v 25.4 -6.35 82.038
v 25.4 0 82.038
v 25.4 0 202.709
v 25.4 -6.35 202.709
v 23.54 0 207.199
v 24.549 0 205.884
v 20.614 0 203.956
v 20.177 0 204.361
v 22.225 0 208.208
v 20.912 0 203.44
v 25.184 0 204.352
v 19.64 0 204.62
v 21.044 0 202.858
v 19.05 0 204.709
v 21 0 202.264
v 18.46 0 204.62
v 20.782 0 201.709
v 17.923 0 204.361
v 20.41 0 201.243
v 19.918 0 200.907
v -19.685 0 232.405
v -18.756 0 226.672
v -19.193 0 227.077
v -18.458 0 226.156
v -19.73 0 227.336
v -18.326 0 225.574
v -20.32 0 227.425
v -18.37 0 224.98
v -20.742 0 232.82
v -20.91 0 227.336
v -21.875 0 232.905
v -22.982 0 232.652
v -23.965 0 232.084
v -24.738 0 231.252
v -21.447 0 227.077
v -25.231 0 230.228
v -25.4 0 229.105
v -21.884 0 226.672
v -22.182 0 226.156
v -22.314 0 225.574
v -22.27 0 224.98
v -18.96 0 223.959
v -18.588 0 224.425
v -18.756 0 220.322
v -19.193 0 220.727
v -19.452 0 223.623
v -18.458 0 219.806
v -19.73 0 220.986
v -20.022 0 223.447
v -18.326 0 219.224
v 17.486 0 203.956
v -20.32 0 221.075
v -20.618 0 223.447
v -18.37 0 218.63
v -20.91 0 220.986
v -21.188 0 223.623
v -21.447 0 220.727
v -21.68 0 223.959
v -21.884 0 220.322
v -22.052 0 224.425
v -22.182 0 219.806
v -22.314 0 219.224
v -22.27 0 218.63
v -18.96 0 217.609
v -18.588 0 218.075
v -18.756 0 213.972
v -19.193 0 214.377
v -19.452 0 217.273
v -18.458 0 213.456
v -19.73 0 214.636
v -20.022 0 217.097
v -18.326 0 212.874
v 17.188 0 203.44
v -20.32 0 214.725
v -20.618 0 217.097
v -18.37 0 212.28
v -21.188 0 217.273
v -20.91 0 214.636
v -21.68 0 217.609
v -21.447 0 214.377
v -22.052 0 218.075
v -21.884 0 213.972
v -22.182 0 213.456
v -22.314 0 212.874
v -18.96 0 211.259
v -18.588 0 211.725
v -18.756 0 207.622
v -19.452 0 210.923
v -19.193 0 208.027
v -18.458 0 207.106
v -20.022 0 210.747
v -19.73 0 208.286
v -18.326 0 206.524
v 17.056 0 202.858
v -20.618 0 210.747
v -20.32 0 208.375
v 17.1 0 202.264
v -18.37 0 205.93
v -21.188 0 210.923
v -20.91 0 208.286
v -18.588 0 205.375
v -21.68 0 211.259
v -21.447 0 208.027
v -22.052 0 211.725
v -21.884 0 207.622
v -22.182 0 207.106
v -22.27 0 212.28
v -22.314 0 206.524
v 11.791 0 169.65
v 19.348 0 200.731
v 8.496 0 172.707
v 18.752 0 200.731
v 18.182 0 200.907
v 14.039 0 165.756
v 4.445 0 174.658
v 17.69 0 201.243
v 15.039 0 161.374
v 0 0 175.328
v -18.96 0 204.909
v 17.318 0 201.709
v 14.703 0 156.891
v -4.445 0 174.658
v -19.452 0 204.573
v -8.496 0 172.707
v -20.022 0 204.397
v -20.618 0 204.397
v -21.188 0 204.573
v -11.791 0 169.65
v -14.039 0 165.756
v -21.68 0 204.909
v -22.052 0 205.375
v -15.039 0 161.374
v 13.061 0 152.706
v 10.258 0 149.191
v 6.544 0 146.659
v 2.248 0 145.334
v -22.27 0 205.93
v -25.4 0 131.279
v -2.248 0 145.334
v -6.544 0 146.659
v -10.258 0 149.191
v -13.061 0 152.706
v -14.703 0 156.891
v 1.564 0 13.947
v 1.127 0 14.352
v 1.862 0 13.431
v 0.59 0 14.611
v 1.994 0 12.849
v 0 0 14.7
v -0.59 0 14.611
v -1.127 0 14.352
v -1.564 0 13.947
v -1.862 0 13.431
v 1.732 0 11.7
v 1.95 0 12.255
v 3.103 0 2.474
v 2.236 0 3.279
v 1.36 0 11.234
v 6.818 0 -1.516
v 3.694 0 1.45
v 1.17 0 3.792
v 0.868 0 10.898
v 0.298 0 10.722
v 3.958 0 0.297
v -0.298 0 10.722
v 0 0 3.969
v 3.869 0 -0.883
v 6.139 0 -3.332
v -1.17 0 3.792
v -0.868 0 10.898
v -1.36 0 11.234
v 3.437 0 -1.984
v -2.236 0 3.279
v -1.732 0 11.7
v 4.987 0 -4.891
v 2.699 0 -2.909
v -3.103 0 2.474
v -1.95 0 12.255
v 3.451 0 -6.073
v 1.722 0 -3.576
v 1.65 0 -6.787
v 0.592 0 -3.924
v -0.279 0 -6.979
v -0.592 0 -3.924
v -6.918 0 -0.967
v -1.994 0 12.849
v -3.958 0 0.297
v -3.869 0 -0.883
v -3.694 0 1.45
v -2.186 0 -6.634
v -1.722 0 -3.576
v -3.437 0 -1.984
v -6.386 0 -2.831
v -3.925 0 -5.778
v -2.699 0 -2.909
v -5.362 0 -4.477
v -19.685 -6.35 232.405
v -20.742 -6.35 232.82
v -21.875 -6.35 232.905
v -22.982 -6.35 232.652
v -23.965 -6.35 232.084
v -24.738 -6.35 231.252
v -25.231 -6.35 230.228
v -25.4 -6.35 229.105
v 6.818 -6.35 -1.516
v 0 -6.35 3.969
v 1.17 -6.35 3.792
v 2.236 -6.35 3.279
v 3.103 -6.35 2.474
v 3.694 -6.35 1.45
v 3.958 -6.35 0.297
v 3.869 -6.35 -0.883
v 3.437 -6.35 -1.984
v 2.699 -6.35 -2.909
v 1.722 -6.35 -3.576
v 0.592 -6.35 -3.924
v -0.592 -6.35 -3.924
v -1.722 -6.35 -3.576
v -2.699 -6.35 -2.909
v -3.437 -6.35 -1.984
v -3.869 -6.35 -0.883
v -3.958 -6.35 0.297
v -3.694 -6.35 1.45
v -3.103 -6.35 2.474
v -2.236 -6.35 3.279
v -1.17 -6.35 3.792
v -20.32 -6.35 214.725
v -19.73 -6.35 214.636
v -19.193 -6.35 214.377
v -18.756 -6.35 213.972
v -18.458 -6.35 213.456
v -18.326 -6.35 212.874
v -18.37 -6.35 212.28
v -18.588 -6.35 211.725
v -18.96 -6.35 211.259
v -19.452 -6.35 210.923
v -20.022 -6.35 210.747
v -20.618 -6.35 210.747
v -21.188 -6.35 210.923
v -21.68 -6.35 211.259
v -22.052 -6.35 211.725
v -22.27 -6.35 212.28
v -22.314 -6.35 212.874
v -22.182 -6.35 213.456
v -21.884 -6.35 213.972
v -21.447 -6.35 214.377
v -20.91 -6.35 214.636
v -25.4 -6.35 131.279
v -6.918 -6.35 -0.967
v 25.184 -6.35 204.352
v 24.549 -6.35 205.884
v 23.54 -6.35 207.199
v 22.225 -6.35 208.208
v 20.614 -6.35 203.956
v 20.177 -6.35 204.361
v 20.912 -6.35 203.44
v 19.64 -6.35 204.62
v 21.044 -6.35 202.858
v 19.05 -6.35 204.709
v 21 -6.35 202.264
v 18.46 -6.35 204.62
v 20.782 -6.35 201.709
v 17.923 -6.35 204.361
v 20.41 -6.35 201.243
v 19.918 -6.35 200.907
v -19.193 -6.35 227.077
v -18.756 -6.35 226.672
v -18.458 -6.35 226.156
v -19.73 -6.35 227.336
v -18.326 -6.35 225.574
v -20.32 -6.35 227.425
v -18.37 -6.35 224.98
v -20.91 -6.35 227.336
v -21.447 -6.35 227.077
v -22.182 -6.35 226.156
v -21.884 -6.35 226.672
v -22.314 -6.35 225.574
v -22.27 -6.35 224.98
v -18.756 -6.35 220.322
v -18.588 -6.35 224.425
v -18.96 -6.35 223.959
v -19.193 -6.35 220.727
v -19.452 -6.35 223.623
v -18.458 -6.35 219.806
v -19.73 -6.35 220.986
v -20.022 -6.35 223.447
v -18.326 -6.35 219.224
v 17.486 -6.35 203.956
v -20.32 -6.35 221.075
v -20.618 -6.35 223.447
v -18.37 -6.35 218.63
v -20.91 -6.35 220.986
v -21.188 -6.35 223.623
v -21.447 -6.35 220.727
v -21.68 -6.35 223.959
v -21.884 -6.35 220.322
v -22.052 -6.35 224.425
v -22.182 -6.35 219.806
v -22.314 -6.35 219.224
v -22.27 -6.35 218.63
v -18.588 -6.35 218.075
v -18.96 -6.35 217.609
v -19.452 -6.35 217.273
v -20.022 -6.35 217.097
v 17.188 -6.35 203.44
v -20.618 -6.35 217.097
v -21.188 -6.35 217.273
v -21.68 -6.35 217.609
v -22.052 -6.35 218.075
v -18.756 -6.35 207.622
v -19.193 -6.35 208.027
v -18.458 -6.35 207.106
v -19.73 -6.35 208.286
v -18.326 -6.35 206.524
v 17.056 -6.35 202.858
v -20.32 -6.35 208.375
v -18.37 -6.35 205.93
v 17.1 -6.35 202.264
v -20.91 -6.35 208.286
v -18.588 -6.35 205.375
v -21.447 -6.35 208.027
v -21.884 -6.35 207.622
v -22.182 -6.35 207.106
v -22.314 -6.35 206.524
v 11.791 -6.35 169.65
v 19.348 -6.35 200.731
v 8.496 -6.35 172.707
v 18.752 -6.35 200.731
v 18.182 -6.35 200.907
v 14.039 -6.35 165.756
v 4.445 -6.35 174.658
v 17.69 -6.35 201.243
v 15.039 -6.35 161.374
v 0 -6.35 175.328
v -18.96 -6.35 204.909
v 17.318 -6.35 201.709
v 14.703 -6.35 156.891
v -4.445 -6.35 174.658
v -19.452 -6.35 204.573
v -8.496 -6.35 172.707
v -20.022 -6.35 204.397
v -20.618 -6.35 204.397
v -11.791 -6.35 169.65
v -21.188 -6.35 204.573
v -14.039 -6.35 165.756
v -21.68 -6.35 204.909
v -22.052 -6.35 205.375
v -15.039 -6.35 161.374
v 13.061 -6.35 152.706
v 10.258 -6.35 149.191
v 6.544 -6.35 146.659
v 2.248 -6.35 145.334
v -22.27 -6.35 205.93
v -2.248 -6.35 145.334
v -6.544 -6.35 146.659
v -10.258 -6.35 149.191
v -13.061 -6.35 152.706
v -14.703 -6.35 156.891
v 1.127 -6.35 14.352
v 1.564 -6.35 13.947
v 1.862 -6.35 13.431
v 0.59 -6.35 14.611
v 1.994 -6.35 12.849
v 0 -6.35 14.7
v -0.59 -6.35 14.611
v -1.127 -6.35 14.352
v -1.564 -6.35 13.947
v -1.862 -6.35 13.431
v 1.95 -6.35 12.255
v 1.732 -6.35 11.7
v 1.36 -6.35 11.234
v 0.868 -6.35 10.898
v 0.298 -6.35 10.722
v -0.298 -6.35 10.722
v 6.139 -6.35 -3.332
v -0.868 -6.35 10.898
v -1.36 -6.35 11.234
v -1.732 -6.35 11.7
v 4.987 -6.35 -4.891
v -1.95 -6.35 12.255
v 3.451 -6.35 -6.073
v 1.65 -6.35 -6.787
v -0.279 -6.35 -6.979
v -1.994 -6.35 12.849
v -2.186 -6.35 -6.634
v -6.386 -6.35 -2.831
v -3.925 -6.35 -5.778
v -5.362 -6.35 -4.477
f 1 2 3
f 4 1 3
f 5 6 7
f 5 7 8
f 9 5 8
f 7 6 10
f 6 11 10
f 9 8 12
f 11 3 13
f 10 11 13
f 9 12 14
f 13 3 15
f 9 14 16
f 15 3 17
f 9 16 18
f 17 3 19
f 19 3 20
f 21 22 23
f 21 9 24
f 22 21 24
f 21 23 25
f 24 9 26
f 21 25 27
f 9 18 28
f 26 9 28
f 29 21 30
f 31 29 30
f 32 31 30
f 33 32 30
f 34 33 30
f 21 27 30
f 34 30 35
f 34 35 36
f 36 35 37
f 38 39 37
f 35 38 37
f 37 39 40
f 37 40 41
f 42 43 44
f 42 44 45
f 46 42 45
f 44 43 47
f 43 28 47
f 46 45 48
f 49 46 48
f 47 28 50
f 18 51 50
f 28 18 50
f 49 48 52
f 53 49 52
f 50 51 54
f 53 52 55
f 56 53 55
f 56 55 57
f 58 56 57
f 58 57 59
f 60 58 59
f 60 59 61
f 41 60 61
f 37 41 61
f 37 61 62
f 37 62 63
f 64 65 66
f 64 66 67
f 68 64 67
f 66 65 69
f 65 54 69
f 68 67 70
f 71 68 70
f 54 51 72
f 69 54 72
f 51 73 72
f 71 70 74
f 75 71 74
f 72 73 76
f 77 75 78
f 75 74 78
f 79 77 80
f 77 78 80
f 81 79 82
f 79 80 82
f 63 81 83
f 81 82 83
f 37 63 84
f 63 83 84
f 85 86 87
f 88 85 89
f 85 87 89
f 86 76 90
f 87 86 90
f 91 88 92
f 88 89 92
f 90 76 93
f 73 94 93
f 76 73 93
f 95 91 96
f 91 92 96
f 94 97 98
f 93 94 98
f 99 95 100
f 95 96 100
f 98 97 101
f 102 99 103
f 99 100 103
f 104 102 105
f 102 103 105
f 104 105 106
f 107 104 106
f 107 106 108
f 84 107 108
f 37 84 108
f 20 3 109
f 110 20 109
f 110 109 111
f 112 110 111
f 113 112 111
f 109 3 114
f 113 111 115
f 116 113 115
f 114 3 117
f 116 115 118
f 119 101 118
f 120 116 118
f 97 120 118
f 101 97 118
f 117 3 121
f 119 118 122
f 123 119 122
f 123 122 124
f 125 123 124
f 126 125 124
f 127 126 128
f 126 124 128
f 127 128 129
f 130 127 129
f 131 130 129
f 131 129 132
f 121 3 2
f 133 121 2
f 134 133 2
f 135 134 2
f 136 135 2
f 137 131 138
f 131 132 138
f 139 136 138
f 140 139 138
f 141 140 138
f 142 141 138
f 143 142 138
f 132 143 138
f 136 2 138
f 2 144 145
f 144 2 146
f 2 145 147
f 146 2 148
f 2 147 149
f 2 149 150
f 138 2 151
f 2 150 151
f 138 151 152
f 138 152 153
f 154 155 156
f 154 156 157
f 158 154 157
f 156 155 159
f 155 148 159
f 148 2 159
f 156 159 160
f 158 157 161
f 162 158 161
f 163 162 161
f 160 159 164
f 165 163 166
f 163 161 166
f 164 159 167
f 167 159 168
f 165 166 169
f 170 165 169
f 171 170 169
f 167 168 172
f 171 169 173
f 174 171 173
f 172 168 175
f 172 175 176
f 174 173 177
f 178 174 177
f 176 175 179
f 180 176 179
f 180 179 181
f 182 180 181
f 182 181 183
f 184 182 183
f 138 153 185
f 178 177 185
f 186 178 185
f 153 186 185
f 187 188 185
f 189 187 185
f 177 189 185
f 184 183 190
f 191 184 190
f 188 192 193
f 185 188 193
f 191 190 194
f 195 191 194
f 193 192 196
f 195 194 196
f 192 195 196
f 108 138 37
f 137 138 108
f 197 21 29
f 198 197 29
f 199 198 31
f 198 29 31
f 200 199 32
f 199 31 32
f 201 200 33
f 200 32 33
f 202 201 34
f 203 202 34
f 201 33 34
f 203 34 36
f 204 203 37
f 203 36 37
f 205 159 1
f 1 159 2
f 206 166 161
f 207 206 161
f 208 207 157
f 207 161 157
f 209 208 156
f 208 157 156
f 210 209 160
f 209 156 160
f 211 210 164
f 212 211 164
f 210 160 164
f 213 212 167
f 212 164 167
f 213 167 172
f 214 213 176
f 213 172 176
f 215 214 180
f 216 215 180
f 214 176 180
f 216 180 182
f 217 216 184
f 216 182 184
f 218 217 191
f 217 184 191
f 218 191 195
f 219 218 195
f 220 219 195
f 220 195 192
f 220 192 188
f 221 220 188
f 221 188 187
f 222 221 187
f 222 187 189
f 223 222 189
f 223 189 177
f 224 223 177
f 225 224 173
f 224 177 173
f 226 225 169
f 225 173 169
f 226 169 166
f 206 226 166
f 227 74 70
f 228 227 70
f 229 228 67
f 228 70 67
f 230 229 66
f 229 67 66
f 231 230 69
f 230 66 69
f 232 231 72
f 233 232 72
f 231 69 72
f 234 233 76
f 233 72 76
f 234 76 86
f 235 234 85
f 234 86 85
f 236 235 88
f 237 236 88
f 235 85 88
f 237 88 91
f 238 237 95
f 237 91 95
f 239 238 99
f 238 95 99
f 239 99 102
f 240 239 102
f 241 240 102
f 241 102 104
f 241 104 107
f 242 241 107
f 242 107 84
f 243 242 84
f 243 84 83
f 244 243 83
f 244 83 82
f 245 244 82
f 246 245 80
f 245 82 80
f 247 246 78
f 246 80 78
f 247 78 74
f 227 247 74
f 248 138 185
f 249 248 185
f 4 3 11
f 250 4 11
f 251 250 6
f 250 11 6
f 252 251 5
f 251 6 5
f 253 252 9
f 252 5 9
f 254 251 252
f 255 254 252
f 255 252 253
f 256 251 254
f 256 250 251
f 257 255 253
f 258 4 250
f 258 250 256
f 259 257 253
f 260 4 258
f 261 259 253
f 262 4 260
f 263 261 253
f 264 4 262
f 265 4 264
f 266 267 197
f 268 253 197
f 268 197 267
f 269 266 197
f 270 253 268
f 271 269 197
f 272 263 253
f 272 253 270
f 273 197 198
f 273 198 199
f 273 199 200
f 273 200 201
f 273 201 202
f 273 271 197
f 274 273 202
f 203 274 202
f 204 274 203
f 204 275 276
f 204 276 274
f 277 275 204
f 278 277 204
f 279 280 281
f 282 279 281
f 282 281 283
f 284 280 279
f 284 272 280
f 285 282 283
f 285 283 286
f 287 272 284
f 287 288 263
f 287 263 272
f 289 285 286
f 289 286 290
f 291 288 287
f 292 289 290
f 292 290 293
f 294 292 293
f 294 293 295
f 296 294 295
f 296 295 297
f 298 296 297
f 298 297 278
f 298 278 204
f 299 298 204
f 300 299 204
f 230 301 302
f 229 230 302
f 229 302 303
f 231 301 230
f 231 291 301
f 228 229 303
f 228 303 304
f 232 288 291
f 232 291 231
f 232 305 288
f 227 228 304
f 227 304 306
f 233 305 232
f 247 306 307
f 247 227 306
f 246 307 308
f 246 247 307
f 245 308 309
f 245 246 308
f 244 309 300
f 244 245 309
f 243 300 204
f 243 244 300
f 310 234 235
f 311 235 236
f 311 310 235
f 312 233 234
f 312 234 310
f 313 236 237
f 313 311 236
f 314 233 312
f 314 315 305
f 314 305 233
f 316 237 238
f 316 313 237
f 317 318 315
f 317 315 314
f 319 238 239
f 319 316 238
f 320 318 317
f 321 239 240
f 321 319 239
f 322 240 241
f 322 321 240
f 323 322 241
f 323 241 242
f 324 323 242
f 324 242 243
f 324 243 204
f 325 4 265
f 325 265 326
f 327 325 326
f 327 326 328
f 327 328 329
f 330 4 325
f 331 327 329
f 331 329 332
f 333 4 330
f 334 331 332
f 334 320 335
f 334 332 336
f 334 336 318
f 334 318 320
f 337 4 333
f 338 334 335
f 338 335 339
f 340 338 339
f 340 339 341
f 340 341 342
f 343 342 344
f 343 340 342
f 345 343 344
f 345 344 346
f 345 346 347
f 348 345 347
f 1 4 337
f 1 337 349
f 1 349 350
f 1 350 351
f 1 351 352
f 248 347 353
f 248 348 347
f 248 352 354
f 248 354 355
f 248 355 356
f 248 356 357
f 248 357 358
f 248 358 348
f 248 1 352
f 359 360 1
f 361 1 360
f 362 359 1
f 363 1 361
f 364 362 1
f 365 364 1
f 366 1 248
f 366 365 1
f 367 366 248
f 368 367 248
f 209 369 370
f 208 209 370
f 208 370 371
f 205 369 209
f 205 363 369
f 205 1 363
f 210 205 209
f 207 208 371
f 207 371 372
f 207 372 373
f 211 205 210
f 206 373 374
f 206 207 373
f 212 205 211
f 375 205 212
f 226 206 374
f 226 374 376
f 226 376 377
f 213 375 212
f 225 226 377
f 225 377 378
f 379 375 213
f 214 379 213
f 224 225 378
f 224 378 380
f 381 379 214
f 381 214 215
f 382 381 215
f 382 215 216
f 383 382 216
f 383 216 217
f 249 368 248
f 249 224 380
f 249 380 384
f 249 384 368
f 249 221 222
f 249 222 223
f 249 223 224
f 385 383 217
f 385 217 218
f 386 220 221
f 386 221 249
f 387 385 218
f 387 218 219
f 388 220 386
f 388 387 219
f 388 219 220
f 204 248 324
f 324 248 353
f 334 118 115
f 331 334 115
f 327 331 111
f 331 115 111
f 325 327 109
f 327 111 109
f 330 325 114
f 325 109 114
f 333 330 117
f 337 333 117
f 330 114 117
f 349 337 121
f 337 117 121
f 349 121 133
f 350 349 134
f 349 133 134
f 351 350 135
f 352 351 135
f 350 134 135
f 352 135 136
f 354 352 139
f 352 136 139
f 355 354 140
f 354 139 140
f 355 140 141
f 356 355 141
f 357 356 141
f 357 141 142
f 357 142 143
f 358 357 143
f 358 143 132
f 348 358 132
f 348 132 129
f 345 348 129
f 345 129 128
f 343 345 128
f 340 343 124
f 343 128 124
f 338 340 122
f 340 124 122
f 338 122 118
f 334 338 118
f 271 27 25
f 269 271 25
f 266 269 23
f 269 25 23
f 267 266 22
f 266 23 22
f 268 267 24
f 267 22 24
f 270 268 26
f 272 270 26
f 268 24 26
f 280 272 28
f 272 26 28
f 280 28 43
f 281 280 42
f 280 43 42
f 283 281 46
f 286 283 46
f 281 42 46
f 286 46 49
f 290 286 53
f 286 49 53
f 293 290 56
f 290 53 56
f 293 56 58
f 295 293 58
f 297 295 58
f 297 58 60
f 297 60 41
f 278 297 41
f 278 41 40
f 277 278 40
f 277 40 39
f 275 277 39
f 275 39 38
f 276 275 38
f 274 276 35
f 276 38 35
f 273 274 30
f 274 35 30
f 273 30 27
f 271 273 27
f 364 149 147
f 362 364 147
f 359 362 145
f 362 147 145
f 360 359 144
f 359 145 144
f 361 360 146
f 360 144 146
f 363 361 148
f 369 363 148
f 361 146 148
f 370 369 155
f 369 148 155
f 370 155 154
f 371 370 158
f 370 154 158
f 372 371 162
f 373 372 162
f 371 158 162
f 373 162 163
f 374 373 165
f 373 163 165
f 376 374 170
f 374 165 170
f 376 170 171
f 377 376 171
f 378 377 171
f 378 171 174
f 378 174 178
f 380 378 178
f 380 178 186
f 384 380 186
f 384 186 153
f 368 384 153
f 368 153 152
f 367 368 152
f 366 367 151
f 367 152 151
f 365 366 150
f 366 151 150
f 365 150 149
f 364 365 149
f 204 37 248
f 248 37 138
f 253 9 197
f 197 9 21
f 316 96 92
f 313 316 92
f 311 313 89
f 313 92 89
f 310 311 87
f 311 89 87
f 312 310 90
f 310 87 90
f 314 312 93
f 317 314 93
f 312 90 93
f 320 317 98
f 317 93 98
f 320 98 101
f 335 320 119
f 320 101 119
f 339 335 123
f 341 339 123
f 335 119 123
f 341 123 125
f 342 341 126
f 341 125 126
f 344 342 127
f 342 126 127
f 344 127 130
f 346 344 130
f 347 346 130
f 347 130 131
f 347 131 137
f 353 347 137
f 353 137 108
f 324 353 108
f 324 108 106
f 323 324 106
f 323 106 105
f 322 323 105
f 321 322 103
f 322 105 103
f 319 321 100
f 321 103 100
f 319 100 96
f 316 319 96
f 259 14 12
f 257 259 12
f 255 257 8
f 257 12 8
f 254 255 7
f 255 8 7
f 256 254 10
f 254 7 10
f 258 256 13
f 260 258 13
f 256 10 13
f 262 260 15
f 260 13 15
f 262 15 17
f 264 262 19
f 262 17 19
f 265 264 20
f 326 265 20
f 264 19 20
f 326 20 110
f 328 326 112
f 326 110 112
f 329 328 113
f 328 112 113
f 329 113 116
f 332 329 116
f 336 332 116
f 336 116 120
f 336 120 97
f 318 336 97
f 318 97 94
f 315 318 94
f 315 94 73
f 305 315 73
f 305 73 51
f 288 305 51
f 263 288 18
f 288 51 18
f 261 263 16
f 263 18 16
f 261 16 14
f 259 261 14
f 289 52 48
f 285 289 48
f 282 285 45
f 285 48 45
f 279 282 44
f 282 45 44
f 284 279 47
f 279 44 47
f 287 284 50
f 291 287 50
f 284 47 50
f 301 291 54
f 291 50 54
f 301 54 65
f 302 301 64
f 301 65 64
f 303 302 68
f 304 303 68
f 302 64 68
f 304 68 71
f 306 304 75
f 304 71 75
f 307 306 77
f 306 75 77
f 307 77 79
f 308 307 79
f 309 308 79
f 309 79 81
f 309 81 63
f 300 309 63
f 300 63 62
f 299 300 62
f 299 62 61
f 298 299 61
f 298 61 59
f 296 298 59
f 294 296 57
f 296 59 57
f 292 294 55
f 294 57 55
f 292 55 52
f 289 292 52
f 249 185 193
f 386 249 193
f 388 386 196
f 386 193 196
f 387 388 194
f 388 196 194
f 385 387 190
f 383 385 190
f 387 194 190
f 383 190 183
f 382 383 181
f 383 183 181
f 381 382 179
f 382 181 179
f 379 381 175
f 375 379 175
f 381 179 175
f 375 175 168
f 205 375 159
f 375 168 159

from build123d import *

# Parameters (mm, degrees)
SKETCH1_R           = 3.96875
SKETCH1_R_2         = 15.08125
SKETCH1_R_3         = 2
BOSS_EXTRUDE1_DEPTH = 6.35


with BuildPart() as part:
    # Sketch1 → Boss-Extrude1 (new body)
    with BuildSketch(Plane(origin=(0, 0, 0), x_dir=(1, 0, 0), z_dir=(0, 1, 0))):
        with BuildLine():
            Line((25.4, -82.038158574), (25.4, -202.708825791))
            ThreePointArc((25.4, -202.708825791), (24.549261314, -205.883825791), (22.225, -208.208087105))
            Line((22.225, -208.208087105), (-19.685, -232.404836886))
            ThreePointArc((-19.685, -232.404836886), (-23.495, -232.404836886), (-25.4, -229.105280098))
            Line((-25.4, -229.105280098), (-25.4, -131.278691098))
            Line((-25.4, -131.278691098), (-6.917767735, 0.966806375))
            ThreePointArc((-6.917767735, 0.966806375), (-0.279220673, 6.97941694), (6.818426198, 1.51634072))
            Line((6.818426198, 1.51634072), (25.4, -82.038158574))
        make_face()
        with Locations(Location((0, 0, 0), (0, 0, 270))):
            Circle(SKETCH1_R, mode=Mode.SUBTRACT)
        with Locations(Location((0, -160.246508934, 0), (0, 0, 270))):
            Circle(SKETCH1_R_2, mode=Mode.SUBTRACT)
        with Locations(Location((-20.32, -225.425, 0), (0, 0, 270))):
            Circle(SKETCH1_R_3, mode=Mode.SUBTRACT)
        with Locations(Location((-20.32, -219.075, 0), (0, 0, 270))):
            Circle(SKETCH1_R_3, mode=Mode.SUBTRACT)
        with Locations(Location((-20.32, -212.725, 0), (0, 0, 270))):
            Circle(SKETCH1_R_3, mode=Mode.SUBTRACT)
        with Locations(Location((-20.32, -206.375, 0), (0, 0, 270))):
            Circle(SKETCH1_R_3, mode=Mode.SUBTRACT)
        with Locations(Location((0, -12.7, 0), (0, 0, 270))):
            Circle(SKETCH1_R_3, mode=Mode.SUBTRACT)
        with Locations(Location((19.05, -202.708825791, 0), (0, 0, 270))):
            Circle(SKETCH1_R_3, mode=Mode.SUBTRACT)
    extrude(amount=-BOSS_EXTRUDE1_DEPTH)


solid = part.part
